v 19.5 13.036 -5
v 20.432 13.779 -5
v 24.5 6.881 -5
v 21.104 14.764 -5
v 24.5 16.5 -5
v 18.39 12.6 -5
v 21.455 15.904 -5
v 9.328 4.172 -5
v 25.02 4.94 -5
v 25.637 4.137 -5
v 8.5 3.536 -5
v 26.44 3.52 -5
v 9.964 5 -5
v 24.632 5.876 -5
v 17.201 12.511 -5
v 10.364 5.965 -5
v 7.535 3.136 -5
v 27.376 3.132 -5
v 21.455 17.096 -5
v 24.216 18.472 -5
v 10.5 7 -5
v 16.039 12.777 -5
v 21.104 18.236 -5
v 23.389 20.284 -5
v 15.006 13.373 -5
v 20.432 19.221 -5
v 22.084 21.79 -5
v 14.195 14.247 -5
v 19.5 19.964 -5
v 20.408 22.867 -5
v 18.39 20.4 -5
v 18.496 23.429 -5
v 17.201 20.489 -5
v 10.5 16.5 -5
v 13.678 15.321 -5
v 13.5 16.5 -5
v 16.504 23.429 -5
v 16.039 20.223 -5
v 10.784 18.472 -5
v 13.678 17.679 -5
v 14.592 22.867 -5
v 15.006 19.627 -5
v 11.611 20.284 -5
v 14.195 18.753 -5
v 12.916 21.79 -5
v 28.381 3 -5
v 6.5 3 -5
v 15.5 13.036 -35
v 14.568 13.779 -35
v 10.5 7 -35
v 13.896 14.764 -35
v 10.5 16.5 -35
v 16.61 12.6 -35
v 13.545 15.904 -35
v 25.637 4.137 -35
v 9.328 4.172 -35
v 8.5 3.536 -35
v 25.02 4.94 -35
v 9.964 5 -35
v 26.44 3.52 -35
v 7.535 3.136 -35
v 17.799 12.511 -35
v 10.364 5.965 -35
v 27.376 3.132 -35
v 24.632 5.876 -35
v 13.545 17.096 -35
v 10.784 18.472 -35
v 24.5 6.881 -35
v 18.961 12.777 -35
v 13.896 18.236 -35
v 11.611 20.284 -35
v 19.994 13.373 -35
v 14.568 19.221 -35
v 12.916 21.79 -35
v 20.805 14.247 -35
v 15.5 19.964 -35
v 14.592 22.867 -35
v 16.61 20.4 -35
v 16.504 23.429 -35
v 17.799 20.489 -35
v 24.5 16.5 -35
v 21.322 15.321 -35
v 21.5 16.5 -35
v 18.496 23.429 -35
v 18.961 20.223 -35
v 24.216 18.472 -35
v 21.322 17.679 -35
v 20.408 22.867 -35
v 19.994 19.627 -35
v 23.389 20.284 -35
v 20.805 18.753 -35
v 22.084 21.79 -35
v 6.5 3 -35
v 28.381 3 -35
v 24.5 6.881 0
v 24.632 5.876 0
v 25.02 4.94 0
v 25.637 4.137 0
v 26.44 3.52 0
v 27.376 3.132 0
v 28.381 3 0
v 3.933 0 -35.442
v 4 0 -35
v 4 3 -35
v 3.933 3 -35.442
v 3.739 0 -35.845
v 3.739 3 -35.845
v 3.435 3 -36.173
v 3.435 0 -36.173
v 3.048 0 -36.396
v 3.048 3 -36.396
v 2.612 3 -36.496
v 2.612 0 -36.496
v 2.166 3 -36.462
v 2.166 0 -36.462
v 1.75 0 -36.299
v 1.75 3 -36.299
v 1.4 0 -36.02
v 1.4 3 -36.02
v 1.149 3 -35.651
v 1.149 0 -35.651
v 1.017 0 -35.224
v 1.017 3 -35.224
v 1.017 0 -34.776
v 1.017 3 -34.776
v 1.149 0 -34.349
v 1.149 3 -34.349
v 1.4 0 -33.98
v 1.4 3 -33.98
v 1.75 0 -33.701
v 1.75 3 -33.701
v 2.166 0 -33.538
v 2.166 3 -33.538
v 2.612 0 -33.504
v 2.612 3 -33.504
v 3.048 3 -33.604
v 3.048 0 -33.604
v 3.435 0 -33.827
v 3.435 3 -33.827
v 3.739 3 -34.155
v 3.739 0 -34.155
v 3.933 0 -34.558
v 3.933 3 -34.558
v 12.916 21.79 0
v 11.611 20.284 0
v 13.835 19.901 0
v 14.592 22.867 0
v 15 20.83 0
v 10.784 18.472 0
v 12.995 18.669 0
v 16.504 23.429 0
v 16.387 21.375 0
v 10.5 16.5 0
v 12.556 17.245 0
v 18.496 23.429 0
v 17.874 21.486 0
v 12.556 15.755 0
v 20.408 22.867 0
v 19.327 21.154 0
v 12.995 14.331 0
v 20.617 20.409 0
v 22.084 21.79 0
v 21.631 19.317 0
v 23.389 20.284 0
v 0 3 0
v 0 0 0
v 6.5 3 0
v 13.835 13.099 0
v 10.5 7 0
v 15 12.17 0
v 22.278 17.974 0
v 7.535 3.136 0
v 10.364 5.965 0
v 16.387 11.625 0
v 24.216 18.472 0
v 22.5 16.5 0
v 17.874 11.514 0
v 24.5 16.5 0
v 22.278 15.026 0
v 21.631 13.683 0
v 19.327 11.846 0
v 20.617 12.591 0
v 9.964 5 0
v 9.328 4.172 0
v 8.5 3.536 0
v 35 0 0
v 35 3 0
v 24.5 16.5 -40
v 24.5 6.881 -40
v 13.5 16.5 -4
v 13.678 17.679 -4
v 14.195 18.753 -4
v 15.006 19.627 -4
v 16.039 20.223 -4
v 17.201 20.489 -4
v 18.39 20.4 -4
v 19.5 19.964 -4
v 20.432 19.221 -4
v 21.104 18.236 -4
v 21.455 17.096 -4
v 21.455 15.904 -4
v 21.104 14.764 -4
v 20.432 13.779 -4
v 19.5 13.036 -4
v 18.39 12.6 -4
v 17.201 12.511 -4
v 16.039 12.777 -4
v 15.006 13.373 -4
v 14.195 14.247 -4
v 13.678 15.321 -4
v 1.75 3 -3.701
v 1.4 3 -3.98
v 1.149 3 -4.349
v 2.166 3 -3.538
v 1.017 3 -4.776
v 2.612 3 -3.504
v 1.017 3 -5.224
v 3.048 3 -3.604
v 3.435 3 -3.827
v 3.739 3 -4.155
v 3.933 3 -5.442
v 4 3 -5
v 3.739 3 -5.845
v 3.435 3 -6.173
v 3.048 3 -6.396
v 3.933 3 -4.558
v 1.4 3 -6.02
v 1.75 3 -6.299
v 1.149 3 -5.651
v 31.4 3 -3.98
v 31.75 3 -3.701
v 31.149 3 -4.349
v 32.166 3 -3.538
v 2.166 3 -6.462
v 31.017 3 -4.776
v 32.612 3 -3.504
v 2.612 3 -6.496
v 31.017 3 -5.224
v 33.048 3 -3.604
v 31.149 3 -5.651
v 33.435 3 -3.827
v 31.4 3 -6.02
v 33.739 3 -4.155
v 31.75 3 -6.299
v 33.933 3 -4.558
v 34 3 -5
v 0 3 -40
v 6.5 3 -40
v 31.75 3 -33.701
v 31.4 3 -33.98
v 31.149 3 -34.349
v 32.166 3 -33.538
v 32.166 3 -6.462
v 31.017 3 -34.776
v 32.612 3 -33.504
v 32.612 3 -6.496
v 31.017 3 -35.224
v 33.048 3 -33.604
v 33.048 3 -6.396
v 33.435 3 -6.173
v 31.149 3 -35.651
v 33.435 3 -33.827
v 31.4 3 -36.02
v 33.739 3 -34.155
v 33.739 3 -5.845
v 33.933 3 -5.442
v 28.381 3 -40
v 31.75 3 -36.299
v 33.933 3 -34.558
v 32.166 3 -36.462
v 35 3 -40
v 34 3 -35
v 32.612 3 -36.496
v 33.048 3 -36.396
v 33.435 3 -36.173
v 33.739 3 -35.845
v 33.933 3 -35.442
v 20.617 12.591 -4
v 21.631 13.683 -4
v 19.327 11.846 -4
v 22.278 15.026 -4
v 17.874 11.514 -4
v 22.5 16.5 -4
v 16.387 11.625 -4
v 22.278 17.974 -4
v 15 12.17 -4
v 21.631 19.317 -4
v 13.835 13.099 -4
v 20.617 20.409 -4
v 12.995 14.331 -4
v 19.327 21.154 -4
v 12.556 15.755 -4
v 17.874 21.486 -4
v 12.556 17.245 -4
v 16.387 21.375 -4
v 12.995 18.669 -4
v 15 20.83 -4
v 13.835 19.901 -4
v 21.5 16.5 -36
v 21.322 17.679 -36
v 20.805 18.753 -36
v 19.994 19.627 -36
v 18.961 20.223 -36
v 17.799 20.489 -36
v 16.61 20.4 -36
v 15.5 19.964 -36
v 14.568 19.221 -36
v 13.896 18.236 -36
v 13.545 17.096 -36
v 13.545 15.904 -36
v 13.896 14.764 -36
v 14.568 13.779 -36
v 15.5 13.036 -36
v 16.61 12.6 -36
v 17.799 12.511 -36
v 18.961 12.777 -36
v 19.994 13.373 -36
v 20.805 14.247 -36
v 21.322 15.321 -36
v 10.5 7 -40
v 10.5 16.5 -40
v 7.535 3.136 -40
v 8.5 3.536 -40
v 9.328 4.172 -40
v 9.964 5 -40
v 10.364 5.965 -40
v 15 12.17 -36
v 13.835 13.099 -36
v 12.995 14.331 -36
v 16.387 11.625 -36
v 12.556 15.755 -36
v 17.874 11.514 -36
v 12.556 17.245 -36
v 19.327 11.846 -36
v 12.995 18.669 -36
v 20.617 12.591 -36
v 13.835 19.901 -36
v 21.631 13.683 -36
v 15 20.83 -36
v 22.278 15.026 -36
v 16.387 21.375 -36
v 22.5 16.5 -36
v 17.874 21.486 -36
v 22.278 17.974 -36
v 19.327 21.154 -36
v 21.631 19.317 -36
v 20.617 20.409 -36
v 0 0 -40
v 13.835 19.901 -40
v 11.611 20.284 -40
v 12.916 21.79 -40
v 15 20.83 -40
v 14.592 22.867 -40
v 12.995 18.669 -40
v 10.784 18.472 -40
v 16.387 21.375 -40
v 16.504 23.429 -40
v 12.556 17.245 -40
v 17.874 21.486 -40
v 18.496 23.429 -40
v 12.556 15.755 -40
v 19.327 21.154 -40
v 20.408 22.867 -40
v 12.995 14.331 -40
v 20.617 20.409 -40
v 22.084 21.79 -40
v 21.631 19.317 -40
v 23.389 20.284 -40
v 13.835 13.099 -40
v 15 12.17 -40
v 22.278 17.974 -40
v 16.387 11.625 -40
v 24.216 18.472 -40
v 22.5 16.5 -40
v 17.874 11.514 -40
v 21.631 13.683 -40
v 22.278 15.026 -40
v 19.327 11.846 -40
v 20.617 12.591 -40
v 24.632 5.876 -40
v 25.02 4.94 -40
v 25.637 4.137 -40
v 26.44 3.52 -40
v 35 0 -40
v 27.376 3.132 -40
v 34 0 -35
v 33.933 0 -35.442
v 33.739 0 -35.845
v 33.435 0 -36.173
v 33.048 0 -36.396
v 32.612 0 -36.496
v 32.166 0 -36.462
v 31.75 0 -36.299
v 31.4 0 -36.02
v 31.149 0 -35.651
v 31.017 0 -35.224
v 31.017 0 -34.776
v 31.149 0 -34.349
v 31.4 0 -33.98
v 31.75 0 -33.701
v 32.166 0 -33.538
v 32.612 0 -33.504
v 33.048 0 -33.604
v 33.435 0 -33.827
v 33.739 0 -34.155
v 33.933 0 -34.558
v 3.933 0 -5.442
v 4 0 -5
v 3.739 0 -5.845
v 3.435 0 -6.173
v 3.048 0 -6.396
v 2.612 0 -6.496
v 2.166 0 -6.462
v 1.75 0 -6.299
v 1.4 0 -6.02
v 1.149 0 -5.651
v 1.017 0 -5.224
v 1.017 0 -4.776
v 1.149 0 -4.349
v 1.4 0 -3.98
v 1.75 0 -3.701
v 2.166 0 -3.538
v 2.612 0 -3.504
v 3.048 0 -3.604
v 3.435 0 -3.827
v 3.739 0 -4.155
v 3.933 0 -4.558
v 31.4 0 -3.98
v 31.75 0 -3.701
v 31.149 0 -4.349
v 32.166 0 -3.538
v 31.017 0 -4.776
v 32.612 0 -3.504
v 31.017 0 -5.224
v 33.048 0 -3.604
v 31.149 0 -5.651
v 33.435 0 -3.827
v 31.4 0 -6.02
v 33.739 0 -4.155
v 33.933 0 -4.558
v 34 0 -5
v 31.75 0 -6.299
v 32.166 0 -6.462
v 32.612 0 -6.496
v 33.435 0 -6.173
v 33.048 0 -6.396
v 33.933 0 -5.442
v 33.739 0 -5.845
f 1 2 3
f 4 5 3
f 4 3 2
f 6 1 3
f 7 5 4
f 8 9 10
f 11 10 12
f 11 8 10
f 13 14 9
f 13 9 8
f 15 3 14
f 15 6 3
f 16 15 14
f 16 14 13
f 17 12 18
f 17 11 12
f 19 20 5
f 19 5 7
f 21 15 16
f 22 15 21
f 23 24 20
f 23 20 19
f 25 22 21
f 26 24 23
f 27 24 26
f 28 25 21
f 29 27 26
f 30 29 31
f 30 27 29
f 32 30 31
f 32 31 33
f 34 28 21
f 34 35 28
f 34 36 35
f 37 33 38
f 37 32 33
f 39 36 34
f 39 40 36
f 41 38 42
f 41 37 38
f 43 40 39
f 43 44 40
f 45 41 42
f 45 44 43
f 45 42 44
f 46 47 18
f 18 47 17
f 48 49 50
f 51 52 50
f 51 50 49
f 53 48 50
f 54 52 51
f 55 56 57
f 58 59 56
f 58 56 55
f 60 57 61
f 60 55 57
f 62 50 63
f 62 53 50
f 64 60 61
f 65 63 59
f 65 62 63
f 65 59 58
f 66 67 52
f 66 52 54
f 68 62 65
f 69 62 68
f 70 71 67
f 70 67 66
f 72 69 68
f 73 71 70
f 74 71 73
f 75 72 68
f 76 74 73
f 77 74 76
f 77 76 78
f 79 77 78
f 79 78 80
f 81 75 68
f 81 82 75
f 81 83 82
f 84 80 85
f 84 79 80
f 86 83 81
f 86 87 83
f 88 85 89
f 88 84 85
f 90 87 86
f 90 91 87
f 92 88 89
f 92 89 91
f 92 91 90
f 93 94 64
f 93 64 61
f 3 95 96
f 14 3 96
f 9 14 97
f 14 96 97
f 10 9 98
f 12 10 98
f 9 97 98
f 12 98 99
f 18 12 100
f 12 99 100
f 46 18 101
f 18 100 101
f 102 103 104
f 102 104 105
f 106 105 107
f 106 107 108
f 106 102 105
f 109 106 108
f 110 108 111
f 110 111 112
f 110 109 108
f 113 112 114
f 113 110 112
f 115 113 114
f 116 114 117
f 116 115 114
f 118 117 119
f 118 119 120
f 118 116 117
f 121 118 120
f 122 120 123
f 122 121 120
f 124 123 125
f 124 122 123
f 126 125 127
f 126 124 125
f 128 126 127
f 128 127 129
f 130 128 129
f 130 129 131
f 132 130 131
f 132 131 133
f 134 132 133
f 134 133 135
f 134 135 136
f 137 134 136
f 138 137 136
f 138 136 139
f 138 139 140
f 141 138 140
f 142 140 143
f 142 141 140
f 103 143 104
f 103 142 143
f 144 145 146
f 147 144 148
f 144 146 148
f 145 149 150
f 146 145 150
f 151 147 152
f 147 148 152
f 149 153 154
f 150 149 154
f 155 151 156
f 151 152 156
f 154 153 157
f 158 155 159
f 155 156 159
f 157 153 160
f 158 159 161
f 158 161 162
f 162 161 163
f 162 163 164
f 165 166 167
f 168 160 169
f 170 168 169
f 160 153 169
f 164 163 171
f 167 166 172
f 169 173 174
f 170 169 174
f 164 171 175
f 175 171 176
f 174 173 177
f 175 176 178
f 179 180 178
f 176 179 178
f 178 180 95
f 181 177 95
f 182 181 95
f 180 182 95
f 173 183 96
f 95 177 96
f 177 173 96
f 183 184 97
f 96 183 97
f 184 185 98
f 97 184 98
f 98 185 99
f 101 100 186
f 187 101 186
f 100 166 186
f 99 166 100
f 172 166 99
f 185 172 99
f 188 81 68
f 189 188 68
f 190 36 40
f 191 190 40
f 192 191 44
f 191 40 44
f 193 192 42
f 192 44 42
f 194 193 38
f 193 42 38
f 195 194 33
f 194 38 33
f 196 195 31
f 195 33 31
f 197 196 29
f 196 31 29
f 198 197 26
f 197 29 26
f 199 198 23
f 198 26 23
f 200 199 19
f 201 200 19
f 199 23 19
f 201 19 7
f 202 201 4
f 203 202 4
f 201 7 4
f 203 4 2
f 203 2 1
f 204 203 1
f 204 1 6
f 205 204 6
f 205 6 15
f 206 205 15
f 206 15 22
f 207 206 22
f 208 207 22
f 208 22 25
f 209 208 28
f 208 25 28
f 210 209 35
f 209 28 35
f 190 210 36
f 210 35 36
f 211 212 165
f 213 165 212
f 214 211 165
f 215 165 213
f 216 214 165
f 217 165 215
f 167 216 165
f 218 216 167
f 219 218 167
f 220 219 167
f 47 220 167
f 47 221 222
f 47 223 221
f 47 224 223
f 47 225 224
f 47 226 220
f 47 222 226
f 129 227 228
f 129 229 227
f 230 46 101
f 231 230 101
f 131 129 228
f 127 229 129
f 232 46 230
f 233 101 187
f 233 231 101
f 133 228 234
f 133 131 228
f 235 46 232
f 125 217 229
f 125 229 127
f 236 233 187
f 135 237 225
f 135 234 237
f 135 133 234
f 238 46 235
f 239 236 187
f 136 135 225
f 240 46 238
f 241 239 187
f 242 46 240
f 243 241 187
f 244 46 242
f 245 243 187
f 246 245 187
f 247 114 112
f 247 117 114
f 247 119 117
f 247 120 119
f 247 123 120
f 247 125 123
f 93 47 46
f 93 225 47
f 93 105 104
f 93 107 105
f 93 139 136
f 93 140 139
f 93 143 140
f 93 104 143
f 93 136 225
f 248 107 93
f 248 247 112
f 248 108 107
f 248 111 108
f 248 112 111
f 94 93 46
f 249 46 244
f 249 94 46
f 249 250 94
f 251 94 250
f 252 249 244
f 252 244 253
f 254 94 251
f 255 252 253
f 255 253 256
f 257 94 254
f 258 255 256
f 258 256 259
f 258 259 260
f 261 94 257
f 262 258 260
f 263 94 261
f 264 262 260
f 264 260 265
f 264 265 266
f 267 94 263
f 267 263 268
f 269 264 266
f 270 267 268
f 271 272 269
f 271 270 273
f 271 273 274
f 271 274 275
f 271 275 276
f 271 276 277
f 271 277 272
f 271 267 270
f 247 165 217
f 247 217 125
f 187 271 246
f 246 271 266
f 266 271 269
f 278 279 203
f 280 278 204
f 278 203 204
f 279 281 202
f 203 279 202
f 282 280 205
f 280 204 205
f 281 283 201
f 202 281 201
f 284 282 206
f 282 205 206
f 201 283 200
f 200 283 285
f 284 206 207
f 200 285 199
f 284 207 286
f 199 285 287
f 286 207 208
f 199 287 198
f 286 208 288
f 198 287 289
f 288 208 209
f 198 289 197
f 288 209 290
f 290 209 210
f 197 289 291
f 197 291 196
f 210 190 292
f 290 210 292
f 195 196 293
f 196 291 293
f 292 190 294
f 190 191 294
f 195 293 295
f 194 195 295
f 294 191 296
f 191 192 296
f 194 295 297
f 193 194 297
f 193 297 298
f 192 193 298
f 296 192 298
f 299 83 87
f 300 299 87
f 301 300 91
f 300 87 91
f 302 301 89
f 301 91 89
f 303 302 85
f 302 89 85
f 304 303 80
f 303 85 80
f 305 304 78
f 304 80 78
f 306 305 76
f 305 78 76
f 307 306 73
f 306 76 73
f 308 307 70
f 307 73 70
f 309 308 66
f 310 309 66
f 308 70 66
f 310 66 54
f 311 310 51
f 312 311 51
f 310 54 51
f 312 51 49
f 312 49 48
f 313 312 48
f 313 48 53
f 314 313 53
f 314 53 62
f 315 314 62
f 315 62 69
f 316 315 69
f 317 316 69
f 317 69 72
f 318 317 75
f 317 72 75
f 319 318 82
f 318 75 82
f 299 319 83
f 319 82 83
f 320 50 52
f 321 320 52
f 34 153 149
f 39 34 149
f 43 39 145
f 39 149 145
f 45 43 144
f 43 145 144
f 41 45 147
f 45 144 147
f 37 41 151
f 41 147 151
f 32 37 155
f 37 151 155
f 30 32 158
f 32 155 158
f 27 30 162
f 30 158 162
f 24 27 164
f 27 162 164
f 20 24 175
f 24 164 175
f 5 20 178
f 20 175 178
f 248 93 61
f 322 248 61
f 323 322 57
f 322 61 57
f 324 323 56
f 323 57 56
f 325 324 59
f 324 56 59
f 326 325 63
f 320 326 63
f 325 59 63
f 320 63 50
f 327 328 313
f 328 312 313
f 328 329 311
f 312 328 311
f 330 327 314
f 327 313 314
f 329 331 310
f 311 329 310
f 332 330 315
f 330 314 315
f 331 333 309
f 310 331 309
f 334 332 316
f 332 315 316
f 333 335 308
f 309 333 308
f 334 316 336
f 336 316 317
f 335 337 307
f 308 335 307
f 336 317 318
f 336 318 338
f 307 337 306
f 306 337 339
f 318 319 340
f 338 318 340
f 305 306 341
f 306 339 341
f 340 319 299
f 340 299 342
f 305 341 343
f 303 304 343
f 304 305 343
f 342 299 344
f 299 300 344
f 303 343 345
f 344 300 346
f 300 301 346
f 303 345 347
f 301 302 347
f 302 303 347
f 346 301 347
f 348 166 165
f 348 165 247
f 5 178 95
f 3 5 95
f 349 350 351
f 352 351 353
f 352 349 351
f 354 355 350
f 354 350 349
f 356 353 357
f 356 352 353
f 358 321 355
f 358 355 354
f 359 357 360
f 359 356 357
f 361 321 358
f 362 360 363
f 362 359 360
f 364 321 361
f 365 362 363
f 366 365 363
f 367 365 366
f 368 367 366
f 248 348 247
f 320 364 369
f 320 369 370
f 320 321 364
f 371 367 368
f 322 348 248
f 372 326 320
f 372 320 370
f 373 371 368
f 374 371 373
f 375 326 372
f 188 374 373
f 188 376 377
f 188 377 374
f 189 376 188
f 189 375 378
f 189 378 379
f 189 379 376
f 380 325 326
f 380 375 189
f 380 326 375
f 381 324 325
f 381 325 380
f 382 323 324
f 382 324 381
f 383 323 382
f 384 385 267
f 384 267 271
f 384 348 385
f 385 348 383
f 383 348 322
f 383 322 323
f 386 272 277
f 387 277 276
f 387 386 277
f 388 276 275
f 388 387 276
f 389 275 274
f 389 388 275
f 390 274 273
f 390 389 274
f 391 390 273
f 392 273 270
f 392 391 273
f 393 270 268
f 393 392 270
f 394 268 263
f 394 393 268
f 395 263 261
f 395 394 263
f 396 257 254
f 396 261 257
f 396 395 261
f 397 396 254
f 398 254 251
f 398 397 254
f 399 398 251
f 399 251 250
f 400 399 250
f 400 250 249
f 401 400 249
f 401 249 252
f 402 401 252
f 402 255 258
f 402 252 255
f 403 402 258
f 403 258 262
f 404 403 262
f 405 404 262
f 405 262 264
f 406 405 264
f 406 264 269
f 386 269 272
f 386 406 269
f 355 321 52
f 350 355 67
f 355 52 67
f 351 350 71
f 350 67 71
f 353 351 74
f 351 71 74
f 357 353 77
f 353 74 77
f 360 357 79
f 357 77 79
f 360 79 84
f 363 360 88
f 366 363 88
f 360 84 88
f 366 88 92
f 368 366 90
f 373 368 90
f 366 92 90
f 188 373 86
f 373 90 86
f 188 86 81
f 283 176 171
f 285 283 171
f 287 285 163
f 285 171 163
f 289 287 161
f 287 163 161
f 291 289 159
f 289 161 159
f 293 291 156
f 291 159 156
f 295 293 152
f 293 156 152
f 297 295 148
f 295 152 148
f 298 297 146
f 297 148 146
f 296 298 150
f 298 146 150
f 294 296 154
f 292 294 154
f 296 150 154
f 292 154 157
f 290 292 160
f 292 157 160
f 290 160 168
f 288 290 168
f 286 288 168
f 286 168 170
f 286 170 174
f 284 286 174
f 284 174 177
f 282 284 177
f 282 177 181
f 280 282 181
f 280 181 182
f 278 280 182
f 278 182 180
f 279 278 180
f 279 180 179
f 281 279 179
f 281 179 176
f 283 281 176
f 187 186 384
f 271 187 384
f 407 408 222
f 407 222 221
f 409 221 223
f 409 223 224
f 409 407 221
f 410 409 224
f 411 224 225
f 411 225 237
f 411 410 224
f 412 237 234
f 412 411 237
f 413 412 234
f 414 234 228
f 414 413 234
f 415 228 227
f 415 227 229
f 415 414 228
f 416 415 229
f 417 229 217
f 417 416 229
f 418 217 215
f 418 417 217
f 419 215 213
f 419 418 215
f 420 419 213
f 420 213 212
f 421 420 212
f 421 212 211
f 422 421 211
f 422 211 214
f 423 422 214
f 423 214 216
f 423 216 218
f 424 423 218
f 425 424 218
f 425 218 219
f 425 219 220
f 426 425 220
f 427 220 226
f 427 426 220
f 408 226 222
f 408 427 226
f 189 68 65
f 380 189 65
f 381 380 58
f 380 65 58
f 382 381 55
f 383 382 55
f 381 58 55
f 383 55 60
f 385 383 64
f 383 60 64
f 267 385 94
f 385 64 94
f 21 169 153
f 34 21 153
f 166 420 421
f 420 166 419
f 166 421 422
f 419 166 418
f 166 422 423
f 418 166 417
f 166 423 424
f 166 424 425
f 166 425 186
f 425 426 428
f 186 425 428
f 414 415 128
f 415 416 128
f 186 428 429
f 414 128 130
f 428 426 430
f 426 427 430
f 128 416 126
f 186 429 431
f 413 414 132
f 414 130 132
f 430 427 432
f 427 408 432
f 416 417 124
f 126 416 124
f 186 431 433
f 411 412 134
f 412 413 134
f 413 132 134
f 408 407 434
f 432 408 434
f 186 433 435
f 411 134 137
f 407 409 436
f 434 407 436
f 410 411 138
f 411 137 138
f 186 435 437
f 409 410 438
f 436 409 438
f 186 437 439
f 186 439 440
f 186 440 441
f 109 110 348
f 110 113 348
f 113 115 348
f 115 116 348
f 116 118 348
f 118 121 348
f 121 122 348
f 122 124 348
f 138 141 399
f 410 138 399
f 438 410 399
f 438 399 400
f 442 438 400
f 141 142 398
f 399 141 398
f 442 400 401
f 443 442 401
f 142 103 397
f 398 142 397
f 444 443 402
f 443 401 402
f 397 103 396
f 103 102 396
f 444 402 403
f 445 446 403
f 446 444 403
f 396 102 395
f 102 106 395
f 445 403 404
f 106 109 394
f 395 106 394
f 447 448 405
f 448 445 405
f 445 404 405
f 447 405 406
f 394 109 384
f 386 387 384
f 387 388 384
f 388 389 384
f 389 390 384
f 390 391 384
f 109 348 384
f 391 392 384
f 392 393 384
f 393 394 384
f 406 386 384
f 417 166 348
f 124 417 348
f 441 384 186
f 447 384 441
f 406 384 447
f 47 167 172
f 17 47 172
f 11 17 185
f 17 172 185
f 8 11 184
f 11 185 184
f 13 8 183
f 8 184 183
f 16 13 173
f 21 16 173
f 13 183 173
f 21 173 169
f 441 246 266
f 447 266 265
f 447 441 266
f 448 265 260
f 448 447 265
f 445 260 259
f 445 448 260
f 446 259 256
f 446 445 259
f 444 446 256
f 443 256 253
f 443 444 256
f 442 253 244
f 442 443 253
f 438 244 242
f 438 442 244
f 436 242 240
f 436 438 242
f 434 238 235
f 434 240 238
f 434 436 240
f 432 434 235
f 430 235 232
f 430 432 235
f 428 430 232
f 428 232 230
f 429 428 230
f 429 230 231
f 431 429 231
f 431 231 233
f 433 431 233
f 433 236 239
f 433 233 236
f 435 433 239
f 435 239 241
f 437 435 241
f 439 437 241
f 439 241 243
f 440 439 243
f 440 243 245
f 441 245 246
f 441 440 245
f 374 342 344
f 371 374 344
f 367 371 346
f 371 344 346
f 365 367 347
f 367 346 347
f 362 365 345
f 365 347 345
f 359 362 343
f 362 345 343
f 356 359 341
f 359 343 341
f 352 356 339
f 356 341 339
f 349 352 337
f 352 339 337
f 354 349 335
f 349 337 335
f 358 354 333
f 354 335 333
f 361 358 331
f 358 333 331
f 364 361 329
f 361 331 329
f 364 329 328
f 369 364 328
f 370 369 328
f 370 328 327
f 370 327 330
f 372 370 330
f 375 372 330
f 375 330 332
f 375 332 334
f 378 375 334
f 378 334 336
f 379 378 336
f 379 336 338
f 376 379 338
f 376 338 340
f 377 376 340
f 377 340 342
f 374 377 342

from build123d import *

# Parameters (mm, degrees)
CROQUIS1_W              = 35
CROQUIS1_H              = 40
CROQUIS1_R              = 1.5
SALIENTE_EXTRUIR1_DEPTH = 3
CROQUIS2_R              = 5
SALIENTE_EXTRUIR2_DEPTH = 40
CROQUIS3_W              = 27
CROQUIS3_H              = 30
CORTAR_EXTRUIR1_DEPTH   = 21.5
CROQUIS4_R              = 5
CROQUIS4_R_2            = 4
SALIENTE_EXTRUIR3_DEPTH = 1
CROQUIS5_R              = 5
CROQUIS5_R_2            = 4
SALIENTE_EXTRUIR4_DEPTH = 1


with BuildPart() as part:
    # Croquis1 → Saliente-Extruir1 (new body)
    with BuildSketch(Plane(origin=(0, 0, 0), x_dir=(1, 0, 0), z_dir=(0, 1, 0))):
        with Locations((17.5, 20)):
            Rectangle(CROQUIS1_W, CROQUIS1_H)
        with Locations((2.5, 35)):
            Circle(CROQUIS1_R, mode=Mode.SUBTRACT)
        with Locations((32.5, 35)):
            Circle(CROQUIS1_R, mode=Mode.SUBTRACT)
        with Locations((32.5, 5)):
            Circle(CROQUIS1_R, mode=Mode.SUBTRACT)
        with Locations((2.5, 5)):
            Circle(CROQUIS1_R, mode=Mode.SUBTRACT)
    extrude(amount=SALIENTE_EXTRUIR1_DEPTH)

    # Croquis2 → Saliente-Extruir2 (add)
    with BuildSketch(Plane.XY):
        with BuildLine():
            Line((24.5, 16.5), (24.5, 6.880942837))
            ThreePointArc((24.5, 6.880942837), (25.636701839, 4.136701839), (28.380942837, 3))
            Line((28.380942837, 3), (6.5, 3))
            ThreePointArc((6.5, 3), (9.328427125, 4.171572875), (10.5, 7))
            Line((10.5, 7), (10.5, 16.5))
            ThreePointArc((10.5, 16.5), (17.5, 23.5), (24.5, 16.5))
        make_face()
        with Locations((17.5, 16.5)):
            Circle(CROQUIS2_R, mode=Mode.SUBTRACT)
    extrude(amount=-SALIENTE_EXTRUIR2_DEPTH)

    # Croquis3 → Cortar-Extruir1 (cut, through all)
    with BuildSketch(Plane(origin=(0, 3, 0), x_dir=(1, 0, 0), z_dir=(0, 1, 0))):
        with Locations((17.5, 20)):
            Rectangle(CROQUIS3_W, CROQUIS3_H)
    extrude(amount=CORTAR_EXTRUIR1_DEPTH, mode=Mode.SUBTRACT)

    # Croquis4 → Saliente-Extruir3 (add)
    with BuildSketch(Plane.XY.offset(-35)):
        with Locations((17.5, 16.5)):
            Circle(CROQUIS4_R)
        with Locations((17.5, 16.5)):
            Circle(CROQUIS4_R_2, mode=Mode.SUBTRACT)
    extrude(amount=-SALIENTE_EXTRUIR3_DEPTH)

    # Croquis5 → Saliente-Extruir4 (add)
    with BuildSketch(Plane(origin=(0, 0, -5), x_dir=(-1, 0, 0), z_dir=(0, 0, -1))):
        with Locations((-17.5, 16.5)):
            Circle(CROQUIS5_R)
        with Locations((-17.5, 16.5)):
            Circle(CROQUIS5_R_2, mode=Mode.SUBTRACT)
    extrude(amount=-SALIENTE_EXTRUIR4_DEPTH)


solid = part.part
